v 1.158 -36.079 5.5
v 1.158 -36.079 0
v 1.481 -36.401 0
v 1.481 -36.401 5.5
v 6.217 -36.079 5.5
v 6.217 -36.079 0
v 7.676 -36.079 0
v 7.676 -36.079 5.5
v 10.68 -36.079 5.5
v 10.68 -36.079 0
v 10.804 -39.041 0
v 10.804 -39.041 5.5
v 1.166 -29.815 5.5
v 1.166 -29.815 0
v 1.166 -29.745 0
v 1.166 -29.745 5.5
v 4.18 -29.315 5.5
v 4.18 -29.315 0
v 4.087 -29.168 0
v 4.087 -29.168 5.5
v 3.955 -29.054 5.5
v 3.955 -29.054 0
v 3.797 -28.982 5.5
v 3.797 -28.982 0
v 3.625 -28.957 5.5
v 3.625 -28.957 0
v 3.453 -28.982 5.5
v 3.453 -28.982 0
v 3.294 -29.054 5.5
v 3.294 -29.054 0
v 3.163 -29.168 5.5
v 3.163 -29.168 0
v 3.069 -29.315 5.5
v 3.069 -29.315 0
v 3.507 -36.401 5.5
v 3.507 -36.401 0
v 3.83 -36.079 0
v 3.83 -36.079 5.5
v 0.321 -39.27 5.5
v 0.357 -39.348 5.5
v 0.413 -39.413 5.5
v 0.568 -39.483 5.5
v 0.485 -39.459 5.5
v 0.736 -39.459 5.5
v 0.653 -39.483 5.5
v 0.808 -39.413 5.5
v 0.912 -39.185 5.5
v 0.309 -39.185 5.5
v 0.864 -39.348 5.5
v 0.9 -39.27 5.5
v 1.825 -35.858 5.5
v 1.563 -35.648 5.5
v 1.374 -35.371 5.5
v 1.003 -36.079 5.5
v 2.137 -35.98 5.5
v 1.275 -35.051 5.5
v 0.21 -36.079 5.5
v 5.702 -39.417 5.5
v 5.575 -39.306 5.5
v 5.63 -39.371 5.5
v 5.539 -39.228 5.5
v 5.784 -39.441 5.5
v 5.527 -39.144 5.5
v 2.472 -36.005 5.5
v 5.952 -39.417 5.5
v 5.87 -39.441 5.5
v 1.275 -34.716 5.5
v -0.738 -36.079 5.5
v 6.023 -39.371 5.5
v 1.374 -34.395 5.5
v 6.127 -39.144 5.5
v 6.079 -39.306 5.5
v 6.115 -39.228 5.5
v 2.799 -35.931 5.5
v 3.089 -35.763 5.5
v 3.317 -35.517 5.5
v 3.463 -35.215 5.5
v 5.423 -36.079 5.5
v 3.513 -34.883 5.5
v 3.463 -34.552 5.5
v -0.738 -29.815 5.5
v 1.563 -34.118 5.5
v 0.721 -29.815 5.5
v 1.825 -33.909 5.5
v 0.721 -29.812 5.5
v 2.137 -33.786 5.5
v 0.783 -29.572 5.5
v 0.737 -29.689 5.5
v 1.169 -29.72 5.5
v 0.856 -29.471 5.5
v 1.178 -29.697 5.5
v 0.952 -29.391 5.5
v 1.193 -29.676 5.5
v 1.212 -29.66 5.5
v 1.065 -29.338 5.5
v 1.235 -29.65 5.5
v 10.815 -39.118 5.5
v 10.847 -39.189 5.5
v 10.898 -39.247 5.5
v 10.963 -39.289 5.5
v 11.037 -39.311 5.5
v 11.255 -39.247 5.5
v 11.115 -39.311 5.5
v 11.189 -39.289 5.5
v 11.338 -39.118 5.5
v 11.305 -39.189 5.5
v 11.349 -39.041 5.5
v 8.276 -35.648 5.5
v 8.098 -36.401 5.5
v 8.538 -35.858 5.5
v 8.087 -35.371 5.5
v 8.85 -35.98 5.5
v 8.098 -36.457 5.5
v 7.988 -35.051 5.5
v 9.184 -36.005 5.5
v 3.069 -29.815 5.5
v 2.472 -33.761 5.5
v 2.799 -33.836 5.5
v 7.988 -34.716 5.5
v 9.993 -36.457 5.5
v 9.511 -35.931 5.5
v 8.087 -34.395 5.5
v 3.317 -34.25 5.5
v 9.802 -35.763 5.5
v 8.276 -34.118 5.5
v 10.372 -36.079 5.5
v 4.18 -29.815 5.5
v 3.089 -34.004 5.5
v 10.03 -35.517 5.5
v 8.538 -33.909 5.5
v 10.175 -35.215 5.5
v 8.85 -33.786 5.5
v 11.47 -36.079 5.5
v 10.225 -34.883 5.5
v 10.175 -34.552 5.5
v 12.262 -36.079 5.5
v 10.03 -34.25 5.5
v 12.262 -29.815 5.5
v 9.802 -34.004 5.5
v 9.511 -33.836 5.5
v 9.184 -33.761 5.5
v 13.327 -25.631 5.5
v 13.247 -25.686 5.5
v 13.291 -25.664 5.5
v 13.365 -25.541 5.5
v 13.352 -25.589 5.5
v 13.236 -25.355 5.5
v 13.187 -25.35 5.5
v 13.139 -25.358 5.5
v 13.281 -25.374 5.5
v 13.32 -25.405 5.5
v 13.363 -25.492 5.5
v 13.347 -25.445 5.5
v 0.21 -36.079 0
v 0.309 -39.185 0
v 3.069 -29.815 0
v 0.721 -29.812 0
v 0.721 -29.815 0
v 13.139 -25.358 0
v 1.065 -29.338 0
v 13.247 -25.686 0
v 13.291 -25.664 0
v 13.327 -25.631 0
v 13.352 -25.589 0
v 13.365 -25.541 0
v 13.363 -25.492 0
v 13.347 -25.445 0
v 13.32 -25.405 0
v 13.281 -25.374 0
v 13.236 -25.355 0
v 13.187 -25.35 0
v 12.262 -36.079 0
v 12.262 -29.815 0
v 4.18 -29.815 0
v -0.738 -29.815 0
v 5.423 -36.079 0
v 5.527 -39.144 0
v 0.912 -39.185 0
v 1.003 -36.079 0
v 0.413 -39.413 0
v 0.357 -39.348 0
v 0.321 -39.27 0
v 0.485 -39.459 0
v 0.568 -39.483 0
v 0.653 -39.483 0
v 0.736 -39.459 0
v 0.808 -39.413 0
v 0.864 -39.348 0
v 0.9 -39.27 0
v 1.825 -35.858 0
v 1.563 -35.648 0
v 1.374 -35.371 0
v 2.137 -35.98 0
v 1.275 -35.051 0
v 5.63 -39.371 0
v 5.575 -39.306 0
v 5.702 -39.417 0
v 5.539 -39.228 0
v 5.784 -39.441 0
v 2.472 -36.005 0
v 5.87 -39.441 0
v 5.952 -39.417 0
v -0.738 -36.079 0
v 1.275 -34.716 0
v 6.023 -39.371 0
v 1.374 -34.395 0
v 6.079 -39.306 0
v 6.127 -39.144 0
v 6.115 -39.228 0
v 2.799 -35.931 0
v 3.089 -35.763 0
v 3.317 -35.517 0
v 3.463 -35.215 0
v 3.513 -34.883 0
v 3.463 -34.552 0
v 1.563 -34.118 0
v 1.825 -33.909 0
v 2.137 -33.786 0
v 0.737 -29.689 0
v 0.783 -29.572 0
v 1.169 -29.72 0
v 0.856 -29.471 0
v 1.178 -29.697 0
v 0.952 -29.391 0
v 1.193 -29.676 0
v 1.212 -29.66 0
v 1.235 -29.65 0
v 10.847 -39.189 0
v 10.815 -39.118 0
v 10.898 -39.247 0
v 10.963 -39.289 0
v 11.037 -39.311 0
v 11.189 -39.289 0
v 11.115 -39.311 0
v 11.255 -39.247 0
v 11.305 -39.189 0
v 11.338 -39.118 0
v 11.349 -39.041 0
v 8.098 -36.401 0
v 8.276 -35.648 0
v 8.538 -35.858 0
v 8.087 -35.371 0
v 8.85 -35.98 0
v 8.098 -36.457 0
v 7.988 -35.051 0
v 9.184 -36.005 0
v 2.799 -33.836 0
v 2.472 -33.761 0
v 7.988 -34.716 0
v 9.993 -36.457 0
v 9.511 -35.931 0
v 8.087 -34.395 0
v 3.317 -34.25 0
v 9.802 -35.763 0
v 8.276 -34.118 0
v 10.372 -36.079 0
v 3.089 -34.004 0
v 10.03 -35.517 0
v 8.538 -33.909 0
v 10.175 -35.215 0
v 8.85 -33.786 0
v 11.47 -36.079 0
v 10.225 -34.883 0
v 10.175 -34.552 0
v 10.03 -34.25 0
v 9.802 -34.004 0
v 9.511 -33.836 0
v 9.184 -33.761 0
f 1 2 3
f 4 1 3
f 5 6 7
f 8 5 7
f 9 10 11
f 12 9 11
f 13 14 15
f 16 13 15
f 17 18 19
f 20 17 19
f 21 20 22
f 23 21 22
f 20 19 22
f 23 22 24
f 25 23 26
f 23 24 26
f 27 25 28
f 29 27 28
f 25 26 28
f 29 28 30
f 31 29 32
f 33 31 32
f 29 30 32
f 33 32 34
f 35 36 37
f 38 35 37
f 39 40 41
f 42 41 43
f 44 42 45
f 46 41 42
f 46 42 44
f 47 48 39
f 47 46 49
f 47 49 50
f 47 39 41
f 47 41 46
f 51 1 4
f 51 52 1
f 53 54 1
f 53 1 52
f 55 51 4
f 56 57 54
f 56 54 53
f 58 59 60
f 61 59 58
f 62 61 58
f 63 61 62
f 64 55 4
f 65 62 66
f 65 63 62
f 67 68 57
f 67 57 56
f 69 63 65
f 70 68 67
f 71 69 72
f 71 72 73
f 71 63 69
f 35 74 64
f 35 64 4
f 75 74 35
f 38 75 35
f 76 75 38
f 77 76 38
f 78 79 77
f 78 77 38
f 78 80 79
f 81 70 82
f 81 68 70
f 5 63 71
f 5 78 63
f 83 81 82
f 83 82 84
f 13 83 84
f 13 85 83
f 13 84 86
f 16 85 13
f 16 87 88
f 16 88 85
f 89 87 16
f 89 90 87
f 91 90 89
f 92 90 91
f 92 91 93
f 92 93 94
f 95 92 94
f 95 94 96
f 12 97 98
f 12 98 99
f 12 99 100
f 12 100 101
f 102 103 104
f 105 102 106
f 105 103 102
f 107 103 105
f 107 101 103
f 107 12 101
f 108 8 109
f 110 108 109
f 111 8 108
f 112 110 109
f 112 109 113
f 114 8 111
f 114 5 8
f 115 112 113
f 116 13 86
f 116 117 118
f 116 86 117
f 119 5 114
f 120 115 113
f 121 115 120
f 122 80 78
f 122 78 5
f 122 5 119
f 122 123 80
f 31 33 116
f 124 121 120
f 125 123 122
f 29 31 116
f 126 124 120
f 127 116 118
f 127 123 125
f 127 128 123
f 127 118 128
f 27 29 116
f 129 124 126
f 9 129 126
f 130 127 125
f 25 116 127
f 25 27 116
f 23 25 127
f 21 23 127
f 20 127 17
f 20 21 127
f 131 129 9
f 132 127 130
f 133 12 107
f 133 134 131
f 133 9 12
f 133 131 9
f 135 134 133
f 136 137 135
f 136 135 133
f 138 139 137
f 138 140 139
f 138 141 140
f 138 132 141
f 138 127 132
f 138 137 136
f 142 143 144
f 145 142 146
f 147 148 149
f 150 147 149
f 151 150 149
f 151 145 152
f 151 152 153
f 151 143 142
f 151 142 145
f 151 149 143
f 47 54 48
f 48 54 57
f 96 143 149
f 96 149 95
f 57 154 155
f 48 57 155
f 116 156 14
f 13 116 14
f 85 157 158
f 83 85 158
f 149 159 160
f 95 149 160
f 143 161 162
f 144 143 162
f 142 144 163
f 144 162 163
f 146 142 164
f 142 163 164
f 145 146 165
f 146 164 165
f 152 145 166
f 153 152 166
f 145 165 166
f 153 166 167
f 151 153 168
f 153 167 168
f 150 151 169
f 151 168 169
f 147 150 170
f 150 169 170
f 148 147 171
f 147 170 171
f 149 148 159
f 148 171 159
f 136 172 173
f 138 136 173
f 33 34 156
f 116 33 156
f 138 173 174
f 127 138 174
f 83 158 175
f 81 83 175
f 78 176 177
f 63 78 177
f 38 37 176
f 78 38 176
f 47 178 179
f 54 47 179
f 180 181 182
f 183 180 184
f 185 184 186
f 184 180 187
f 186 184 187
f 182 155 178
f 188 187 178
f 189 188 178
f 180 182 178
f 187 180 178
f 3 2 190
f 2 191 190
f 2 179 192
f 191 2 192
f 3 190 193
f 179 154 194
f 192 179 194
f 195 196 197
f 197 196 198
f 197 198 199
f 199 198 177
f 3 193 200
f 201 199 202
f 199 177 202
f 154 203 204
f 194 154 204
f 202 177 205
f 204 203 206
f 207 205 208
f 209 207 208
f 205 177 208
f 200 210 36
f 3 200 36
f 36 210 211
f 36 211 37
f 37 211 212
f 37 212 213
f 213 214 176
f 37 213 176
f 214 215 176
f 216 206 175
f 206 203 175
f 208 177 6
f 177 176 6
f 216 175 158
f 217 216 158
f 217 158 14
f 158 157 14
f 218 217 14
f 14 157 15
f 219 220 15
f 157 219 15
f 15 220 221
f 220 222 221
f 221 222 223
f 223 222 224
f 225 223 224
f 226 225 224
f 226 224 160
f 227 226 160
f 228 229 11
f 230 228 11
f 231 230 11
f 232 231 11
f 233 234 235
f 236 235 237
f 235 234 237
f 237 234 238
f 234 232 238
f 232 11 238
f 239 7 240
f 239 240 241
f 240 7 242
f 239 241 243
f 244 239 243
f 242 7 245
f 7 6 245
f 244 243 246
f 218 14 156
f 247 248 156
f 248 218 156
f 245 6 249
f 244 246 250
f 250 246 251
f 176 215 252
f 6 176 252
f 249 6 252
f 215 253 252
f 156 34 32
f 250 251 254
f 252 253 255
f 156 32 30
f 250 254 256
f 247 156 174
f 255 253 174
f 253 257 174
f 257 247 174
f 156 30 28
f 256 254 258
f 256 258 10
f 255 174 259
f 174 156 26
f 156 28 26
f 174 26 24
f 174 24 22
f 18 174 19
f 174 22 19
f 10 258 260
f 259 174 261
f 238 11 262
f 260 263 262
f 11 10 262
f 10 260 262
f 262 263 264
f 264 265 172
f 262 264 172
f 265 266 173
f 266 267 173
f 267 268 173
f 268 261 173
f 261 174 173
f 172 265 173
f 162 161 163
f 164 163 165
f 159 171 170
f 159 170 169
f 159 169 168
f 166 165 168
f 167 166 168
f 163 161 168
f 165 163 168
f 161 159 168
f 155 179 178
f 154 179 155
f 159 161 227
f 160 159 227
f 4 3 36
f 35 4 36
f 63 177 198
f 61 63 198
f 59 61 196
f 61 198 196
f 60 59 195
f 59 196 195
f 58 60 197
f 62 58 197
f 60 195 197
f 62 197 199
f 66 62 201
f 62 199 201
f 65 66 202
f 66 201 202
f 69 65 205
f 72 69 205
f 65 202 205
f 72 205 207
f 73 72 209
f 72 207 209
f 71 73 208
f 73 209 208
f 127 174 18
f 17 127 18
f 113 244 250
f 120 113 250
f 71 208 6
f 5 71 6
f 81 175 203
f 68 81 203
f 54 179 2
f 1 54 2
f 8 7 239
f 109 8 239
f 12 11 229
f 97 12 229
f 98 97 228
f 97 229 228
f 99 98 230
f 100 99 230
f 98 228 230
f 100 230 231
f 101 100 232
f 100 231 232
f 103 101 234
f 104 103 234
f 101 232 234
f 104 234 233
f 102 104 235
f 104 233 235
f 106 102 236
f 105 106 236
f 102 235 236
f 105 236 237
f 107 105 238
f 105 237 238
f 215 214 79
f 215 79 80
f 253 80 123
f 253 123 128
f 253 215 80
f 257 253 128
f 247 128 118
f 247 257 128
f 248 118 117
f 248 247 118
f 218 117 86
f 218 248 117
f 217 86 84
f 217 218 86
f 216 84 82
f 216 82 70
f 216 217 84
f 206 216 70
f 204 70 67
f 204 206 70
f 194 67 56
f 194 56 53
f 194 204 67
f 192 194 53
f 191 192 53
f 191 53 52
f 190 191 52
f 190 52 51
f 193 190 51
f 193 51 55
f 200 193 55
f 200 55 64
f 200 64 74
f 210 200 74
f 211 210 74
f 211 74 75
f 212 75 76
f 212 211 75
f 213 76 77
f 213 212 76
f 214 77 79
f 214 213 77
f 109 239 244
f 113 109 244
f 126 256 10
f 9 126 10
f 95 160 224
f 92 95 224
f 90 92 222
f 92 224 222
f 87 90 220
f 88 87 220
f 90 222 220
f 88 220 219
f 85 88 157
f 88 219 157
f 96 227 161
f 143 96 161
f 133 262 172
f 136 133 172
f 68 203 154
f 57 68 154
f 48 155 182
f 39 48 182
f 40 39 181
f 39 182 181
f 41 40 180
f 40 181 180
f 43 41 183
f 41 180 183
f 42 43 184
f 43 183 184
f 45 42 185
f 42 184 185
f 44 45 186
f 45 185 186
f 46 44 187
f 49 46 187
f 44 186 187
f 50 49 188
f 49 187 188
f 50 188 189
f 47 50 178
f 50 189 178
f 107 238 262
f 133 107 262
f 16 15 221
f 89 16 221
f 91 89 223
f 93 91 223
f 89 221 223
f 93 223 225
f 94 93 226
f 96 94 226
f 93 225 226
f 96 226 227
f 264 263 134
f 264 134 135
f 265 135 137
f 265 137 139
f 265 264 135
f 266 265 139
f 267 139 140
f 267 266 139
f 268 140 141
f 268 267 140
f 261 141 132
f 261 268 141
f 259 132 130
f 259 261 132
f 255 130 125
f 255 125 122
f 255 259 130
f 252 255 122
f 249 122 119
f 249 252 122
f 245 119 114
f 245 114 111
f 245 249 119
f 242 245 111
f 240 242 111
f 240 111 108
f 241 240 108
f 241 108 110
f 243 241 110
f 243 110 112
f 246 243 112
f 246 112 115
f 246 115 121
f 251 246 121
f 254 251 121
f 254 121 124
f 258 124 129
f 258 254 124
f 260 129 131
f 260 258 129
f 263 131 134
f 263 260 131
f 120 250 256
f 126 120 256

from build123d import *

# Parameters (mm, degrees)
IZIM1_R                     = 1.125
Y_KSEKLIK_EKSTR_ZYON1_DEPTH = 5.5


with BuildPart() as part:
    # Çizim1 → Yükseklik-Ekstrüzyon1 (new body)
    with BuildSketch(Plane.XY):
        with BuildLine():
            Line((-0.73750862, -36.078547579), (0.210244923, -36.078547579))
            Line((0.210244923, -36.078547579), (0.309026113, -39.184890491))
            ThreePointArc((0.309026113, -39.184890491), (0.610430221, -39.4862946), (0.91183433, -39.184890491))
            Line((0.91183433, -39.184890491), (1.002609544, -36.078547579))
            Line((1.002609544, -36.078547579), (1.157998466, -36.078547579))
            Line((1.157998466, -36.078547579), (1.480686358, -36.401235471))
            Line((1.480686358, -36.401235471), (3.507166322, -36.401235471))
            Line((3.507166322, -36.401235471), (3.829854214, -36.078547579))
            Line((3.829854214, -36.078547579), (5.422522789, -36.078547579))
            Line((5.422522789, -36.078547579), (5.526914996, -39.143906466))
            ThreePointArc((5.526914996, -39.143906466), (5.826979248, -39.443970718), (6.1270435, -39.143906466))
            Line((6.1270435, -39.143906466), (6.216621056, -36.078547579))
            Line((6.216621056, -36.078547579), (7.67629389, -36.078547579))
            Line((7.67629389, -36.078547579), (8.097584701, -36.401235471))
            Line((8.097584701, -36.401235471), (8.097584701, -36.457430984))
            Line((8.097584701, -36.457430984), (9.992871432, -36.457430984))
            Line((9.992871432, -36.457430984), (10.371754838, -36.078547579))
            Line((10.371754838, -36.078547579), (10.679552543, -36.078547579))
            Line((10.679552543, -36.078547579), (10.803656958, -39.041199534))
            ThreePointArc((10.803656958, -39.041199534), (11.076182099, -39.313724675), (11.34870724, -39.041199534))
            Line((11.34870724, -39.041199534), (11.469552543, -36.078547579))
            Line((11.469552543, -36.078547579), (12.26249138, -36.078547579))
            Line((12.26249138, -36.078547579), (12.26249138, -29.81509131))
            Line((12.26249138, -29.81509131), (4.18034079, -29.81509131))
            Line((4.18034079, -29.81509131), (4.18034079, -29.31509131))
            ThreePointArc((4.18034079, -29.31509131), (3.624816768, -28.956669378), (3.069292745, -29.31509131))
            Line((3.069292745, -29.31509131), (3.069292745, -29.81509131))
            Line((3.069292745, -29.81509131), (1.165892063, -29.81509131))
            Line((1.165892063, -29.81509131), (1.165892063, -29.744693477))
            ThreePointArc((1.165892063, -29.744693477), (1.184856501, -29.68609964), (1.234556818, -29.649729787))
            Line((1.234556818, -29.649729787), (13.247034334, -25.685962886))
            ThreePointArc((13.247034334, -25.685962886), (13.356857182, -25.468018658), (13.138932408, -25.358157209))
            Line((13.138932408, -25.358157209), (1.064608949, -29.337589121))
            ThreePointArc((1.064608949, -29.337589121), (0.815991055, -29.519422097), (0.721116967, -29.812463042))
            Line((0.721116967, -29.812463042), (0.721116967, -29.81509131))
            Line((0.721116967, -29.81509131), (-0.73750862, -29.81509131))
            Line((-0.73750862, -29.81509131), (-0.73750862, -36.078547579))
        make_face()
        with Locations((2.387599646, -34.883277444)):
            Circle(IZIM1_R, mode=Mode.SUBTRACT)
        with Locations((9.100214646, -34.883277444)):
            Circle(IZIM1_R, mode=Mode.SUBTRACT)
    extrude(amount=Y_KSEKLIK_EKSTR_ZYON1_DEPTH)


solid = part.part
